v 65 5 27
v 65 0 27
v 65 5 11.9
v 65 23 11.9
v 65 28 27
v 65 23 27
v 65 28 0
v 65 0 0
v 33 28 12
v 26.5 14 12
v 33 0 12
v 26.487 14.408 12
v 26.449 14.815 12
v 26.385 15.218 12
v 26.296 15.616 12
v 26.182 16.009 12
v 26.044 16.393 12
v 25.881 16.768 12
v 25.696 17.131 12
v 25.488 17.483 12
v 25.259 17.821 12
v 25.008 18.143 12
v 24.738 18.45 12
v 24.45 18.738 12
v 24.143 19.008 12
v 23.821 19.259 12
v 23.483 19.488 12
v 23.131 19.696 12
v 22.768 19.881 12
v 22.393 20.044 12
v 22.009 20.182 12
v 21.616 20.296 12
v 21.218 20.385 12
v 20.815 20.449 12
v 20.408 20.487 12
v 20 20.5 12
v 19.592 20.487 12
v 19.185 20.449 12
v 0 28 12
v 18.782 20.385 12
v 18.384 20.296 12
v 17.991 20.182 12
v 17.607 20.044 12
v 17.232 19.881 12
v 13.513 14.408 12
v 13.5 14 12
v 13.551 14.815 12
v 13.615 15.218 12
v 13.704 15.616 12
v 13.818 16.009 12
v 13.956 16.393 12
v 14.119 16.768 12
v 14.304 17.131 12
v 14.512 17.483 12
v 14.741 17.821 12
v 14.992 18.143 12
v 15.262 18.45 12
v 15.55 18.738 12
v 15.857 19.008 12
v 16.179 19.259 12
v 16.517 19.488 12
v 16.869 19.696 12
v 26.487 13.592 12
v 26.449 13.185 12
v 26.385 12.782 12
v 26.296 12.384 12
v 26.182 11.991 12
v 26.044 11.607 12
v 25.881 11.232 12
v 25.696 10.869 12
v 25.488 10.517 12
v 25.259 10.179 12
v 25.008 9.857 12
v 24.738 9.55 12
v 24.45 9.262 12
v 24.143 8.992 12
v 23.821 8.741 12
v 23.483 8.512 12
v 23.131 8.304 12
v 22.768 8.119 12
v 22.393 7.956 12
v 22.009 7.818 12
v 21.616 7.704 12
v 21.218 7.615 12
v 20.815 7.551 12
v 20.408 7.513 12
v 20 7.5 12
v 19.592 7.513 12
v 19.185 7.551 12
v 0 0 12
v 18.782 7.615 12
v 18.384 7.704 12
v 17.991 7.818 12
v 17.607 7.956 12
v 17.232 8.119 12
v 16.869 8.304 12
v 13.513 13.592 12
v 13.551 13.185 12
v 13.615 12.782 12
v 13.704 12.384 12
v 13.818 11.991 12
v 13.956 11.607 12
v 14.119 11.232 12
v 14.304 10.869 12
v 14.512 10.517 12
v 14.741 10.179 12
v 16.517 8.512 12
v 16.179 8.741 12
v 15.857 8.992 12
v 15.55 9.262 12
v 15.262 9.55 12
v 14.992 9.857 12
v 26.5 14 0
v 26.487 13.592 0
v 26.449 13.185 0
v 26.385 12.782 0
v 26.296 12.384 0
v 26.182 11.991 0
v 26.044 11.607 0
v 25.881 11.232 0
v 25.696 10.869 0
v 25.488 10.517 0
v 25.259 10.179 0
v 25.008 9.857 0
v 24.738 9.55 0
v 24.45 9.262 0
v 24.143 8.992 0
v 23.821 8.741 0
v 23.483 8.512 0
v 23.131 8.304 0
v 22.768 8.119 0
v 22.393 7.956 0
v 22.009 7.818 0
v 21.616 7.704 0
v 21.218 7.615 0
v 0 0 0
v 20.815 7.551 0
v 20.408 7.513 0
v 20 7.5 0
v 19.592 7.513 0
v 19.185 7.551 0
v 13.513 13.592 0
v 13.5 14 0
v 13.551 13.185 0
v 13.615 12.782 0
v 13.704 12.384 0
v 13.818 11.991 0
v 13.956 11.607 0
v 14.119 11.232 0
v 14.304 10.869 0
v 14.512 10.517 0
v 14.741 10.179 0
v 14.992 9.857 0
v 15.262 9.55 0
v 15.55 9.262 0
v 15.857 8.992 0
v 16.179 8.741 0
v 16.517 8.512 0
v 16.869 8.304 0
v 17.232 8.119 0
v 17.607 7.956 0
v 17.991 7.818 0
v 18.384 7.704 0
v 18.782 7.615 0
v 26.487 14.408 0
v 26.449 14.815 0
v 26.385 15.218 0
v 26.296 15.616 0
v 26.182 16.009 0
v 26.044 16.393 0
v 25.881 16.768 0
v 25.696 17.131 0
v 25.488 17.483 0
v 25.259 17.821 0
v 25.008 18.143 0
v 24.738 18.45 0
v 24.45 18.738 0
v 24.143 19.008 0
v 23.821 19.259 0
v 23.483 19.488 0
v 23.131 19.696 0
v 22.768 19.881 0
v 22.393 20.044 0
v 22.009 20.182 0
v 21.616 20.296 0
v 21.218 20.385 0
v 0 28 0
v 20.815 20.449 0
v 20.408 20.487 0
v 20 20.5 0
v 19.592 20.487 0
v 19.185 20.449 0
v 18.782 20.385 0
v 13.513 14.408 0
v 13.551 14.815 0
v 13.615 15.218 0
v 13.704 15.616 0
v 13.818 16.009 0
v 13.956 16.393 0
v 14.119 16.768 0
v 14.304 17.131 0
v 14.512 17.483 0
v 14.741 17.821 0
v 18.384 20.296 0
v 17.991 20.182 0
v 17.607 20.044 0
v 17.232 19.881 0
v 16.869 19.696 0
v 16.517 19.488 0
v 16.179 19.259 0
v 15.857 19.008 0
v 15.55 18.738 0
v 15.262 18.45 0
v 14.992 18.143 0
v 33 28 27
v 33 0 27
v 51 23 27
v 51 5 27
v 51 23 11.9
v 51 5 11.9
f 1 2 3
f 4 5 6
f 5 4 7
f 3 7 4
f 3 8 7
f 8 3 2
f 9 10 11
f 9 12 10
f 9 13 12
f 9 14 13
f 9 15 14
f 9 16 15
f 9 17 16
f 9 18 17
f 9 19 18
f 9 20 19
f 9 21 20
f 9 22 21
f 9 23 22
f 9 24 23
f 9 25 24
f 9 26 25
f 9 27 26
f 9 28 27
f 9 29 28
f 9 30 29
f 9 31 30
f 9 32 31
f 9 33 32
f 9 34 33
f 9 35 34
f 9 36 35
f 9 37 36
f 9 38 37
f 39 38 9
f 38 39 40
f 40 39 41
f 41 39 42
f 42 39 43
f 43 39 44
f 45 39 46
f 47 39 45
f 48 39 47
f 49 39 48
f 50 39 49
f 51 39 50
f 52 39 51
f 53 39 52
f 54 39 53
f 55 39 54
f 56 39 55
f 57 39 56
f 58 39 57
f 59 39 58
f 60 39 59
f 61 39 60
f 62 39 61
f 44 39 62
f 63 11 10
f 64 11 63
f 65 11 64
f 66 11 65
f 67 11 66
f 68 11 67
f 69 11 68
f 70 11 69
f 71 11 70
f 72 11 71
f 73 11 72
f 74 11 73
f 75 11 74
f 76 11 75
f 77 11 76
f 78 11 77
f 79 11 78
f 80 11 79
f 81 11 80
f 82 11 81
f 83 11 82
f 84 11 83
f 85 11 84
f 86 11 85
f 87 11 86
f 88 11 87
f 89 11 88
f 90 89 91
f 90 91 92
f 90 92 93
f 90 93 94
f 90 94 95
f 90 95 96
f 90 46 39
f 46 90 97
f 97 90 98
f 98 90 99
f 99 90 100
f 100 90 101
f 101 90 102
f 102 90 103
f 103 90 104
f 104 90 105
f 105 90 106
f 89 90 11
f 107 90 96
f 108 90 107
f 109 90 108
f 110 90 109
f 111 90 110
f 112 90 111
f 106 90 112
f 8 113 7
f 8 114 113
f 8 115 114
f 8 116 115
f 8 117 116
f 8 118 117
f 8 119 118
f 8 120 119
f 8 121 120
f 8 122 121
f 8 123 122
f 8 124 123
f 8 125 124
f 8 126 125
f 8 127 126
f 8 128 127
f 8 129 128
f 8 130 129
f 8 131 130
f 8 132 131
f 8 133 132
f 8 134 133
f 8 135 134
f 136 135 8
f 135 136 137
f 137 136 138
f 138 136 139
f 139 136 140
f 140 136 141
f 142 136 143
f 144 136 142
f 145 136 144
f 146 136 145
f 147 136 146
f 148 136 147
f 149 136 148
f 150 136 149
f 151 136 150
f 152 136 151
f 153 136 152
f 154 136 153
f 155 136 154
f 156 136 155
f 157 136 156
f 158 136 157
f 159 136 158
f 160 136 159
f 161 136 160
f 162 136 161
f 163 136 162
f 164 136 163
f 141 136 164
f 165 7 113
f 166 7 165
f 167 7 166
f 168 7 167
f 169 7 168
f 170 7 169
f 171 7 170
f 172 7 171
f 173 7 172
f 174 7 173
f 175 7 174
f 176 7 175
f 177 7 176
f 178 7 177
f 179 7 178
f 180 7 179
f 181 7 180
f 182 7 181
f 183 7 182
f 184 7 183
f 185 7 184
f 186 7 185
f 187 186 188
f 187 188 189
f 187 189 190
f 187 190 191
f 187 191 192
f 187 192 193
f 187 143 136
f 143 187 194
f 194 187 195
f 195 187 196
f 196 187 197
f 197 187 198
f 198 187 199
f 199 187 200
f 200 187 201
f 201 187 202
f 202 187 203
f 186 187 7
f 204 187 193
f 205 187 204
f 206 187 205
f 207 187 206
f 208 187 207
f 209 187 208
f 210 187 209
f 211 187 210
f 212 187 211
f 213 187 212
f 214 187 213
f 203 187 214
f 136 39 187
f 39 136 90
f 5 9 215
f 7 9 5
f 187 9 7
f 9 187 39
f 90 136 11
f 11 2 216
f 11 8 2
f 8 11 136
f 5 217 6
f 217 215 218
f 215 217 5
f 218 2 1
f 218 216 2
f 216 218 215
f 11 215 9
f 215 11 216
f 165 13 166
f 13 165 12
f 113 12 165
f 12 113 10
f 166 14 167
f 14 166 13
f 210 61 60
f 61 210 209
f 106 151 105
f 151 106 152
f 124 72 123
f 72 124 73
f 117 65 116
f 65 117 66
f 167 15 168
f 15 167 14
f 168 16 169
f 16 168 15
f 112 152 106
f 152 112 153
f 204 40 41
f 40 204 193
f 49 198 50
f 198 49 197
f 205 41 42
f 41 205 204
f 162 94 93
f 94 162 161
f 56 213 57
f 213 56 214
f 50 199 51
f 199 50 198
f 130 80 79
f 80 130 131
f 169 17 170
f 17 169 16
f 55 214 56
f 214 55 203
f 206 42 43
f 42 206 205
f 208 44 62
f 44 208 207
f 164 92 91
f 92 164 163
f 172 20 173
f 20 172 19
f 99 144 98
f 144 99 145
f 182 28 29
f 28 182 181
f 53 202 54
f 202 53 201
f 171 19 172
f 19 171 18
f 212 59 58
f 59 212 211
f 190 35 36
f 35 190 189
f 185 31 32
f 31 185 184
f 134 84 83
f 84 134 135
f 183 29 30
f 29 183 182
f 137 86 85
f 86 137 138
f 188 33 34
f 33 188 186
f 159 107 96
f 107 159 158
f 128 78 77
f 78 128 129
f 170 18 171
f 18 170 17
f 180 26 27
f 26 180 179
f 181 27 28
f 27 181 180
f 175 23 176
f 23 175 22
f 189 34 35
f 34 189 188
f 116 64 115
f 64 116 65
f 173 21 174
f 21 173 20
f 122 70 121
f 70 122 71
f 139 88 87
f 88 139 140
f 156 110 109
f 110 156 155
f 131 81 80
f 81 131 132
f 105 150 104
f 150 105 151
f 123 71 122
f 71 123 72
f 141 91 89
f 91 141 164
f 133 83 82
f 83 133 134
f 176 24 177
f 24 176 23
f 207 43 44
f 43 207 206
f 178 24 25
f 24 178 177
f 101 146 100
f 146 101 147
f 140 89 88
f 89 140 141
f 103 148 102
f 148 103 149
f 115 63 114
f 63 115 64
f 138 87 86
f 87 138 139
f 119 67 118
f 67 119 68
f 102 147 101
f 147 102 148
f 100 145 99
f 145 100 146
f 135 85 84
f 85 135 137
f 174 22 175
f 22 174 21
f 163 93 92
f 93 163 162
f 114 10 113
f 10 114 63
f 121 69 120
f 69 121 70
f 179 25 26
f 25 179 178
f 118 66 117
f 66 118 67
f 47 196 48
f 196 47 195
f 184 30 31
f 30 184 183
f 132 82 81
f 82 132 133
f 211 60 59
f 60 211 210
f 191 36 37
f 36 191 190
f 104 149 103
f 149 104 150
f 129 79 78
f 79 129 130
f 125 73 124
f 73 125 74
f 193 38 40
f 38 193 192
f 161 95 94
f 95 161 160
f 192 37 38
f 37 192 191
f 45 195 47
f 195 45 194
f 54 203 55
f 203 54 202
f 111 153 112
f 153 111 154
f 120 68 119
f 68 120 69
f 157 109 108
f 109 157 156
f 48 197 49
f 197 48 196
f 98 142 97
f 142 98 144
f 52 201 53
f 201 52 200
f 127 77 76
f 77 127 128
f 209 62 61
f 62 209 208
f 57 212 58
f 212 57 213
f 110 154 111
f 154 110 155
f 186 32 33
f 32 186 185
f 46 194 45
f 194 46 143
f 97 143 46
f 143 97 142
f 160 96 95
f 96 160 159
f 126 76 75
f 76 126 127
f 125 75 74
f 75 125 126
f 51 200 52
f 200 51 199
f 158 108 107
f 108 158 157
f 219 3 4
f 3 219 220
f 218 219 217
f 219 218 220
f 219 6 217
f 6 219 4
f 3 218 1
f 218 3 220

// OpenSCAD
// ================================================
// BẢN VẼ KỸ THUẬT CƠ KHÍ - GÁ CHẠC LỖ TRÒN
// Đơn vị: mm
// ================================================

$fn = 100; // Độ mịn cho khối tròn

// Thông số kích thước
total_length = 65;
total_width  = 28;
total_height = 27;
base_height  = 12; // Chiều cao phần đế

step_length  = 32; // Chiều dài bậc trên (tính từ mép phải)

hole_x       = 20; // Tâm lỗ cách mép trái
hole_dia     = 13; // Đường kính lỗ tròn

slot_depth   = 14; // Chiều sâu rãnh chữ U (tính từ mép phải)
slot_width   = 18; // Chiều rộng rãnh chữ U

module ga_chac() {
    difference() {
        // Khối tổng thể (Gồm đế + Bậc trên)
        union() {
            // 1. Đế dưới
            cube([total_length, total_width, base_height]);
            
            // 2. Bậc phía trên (nằm ở phía phải)
            translate([total_length - step_length, 0, base_height])
                cube([step_length, total_width, total_height - base_height]);
        }
        
        // 3. Lỗ tròn xuyện qua đế bên trái
        translate([hole_x, total_width / 2, -1])
            cylinder(d = hole_dia, h = base_height + 2);
            
        // 4. Rãnh chữ U ở bậc trên bên phải
        translate([total_length - slot_depth, (total_width - slot_width) / 2, base_height - 0.1])
            cube([slot_depth + 1, slot_width, total_height - base_height + 1]);
    }
}

// Dựng hình
ga_chac();
